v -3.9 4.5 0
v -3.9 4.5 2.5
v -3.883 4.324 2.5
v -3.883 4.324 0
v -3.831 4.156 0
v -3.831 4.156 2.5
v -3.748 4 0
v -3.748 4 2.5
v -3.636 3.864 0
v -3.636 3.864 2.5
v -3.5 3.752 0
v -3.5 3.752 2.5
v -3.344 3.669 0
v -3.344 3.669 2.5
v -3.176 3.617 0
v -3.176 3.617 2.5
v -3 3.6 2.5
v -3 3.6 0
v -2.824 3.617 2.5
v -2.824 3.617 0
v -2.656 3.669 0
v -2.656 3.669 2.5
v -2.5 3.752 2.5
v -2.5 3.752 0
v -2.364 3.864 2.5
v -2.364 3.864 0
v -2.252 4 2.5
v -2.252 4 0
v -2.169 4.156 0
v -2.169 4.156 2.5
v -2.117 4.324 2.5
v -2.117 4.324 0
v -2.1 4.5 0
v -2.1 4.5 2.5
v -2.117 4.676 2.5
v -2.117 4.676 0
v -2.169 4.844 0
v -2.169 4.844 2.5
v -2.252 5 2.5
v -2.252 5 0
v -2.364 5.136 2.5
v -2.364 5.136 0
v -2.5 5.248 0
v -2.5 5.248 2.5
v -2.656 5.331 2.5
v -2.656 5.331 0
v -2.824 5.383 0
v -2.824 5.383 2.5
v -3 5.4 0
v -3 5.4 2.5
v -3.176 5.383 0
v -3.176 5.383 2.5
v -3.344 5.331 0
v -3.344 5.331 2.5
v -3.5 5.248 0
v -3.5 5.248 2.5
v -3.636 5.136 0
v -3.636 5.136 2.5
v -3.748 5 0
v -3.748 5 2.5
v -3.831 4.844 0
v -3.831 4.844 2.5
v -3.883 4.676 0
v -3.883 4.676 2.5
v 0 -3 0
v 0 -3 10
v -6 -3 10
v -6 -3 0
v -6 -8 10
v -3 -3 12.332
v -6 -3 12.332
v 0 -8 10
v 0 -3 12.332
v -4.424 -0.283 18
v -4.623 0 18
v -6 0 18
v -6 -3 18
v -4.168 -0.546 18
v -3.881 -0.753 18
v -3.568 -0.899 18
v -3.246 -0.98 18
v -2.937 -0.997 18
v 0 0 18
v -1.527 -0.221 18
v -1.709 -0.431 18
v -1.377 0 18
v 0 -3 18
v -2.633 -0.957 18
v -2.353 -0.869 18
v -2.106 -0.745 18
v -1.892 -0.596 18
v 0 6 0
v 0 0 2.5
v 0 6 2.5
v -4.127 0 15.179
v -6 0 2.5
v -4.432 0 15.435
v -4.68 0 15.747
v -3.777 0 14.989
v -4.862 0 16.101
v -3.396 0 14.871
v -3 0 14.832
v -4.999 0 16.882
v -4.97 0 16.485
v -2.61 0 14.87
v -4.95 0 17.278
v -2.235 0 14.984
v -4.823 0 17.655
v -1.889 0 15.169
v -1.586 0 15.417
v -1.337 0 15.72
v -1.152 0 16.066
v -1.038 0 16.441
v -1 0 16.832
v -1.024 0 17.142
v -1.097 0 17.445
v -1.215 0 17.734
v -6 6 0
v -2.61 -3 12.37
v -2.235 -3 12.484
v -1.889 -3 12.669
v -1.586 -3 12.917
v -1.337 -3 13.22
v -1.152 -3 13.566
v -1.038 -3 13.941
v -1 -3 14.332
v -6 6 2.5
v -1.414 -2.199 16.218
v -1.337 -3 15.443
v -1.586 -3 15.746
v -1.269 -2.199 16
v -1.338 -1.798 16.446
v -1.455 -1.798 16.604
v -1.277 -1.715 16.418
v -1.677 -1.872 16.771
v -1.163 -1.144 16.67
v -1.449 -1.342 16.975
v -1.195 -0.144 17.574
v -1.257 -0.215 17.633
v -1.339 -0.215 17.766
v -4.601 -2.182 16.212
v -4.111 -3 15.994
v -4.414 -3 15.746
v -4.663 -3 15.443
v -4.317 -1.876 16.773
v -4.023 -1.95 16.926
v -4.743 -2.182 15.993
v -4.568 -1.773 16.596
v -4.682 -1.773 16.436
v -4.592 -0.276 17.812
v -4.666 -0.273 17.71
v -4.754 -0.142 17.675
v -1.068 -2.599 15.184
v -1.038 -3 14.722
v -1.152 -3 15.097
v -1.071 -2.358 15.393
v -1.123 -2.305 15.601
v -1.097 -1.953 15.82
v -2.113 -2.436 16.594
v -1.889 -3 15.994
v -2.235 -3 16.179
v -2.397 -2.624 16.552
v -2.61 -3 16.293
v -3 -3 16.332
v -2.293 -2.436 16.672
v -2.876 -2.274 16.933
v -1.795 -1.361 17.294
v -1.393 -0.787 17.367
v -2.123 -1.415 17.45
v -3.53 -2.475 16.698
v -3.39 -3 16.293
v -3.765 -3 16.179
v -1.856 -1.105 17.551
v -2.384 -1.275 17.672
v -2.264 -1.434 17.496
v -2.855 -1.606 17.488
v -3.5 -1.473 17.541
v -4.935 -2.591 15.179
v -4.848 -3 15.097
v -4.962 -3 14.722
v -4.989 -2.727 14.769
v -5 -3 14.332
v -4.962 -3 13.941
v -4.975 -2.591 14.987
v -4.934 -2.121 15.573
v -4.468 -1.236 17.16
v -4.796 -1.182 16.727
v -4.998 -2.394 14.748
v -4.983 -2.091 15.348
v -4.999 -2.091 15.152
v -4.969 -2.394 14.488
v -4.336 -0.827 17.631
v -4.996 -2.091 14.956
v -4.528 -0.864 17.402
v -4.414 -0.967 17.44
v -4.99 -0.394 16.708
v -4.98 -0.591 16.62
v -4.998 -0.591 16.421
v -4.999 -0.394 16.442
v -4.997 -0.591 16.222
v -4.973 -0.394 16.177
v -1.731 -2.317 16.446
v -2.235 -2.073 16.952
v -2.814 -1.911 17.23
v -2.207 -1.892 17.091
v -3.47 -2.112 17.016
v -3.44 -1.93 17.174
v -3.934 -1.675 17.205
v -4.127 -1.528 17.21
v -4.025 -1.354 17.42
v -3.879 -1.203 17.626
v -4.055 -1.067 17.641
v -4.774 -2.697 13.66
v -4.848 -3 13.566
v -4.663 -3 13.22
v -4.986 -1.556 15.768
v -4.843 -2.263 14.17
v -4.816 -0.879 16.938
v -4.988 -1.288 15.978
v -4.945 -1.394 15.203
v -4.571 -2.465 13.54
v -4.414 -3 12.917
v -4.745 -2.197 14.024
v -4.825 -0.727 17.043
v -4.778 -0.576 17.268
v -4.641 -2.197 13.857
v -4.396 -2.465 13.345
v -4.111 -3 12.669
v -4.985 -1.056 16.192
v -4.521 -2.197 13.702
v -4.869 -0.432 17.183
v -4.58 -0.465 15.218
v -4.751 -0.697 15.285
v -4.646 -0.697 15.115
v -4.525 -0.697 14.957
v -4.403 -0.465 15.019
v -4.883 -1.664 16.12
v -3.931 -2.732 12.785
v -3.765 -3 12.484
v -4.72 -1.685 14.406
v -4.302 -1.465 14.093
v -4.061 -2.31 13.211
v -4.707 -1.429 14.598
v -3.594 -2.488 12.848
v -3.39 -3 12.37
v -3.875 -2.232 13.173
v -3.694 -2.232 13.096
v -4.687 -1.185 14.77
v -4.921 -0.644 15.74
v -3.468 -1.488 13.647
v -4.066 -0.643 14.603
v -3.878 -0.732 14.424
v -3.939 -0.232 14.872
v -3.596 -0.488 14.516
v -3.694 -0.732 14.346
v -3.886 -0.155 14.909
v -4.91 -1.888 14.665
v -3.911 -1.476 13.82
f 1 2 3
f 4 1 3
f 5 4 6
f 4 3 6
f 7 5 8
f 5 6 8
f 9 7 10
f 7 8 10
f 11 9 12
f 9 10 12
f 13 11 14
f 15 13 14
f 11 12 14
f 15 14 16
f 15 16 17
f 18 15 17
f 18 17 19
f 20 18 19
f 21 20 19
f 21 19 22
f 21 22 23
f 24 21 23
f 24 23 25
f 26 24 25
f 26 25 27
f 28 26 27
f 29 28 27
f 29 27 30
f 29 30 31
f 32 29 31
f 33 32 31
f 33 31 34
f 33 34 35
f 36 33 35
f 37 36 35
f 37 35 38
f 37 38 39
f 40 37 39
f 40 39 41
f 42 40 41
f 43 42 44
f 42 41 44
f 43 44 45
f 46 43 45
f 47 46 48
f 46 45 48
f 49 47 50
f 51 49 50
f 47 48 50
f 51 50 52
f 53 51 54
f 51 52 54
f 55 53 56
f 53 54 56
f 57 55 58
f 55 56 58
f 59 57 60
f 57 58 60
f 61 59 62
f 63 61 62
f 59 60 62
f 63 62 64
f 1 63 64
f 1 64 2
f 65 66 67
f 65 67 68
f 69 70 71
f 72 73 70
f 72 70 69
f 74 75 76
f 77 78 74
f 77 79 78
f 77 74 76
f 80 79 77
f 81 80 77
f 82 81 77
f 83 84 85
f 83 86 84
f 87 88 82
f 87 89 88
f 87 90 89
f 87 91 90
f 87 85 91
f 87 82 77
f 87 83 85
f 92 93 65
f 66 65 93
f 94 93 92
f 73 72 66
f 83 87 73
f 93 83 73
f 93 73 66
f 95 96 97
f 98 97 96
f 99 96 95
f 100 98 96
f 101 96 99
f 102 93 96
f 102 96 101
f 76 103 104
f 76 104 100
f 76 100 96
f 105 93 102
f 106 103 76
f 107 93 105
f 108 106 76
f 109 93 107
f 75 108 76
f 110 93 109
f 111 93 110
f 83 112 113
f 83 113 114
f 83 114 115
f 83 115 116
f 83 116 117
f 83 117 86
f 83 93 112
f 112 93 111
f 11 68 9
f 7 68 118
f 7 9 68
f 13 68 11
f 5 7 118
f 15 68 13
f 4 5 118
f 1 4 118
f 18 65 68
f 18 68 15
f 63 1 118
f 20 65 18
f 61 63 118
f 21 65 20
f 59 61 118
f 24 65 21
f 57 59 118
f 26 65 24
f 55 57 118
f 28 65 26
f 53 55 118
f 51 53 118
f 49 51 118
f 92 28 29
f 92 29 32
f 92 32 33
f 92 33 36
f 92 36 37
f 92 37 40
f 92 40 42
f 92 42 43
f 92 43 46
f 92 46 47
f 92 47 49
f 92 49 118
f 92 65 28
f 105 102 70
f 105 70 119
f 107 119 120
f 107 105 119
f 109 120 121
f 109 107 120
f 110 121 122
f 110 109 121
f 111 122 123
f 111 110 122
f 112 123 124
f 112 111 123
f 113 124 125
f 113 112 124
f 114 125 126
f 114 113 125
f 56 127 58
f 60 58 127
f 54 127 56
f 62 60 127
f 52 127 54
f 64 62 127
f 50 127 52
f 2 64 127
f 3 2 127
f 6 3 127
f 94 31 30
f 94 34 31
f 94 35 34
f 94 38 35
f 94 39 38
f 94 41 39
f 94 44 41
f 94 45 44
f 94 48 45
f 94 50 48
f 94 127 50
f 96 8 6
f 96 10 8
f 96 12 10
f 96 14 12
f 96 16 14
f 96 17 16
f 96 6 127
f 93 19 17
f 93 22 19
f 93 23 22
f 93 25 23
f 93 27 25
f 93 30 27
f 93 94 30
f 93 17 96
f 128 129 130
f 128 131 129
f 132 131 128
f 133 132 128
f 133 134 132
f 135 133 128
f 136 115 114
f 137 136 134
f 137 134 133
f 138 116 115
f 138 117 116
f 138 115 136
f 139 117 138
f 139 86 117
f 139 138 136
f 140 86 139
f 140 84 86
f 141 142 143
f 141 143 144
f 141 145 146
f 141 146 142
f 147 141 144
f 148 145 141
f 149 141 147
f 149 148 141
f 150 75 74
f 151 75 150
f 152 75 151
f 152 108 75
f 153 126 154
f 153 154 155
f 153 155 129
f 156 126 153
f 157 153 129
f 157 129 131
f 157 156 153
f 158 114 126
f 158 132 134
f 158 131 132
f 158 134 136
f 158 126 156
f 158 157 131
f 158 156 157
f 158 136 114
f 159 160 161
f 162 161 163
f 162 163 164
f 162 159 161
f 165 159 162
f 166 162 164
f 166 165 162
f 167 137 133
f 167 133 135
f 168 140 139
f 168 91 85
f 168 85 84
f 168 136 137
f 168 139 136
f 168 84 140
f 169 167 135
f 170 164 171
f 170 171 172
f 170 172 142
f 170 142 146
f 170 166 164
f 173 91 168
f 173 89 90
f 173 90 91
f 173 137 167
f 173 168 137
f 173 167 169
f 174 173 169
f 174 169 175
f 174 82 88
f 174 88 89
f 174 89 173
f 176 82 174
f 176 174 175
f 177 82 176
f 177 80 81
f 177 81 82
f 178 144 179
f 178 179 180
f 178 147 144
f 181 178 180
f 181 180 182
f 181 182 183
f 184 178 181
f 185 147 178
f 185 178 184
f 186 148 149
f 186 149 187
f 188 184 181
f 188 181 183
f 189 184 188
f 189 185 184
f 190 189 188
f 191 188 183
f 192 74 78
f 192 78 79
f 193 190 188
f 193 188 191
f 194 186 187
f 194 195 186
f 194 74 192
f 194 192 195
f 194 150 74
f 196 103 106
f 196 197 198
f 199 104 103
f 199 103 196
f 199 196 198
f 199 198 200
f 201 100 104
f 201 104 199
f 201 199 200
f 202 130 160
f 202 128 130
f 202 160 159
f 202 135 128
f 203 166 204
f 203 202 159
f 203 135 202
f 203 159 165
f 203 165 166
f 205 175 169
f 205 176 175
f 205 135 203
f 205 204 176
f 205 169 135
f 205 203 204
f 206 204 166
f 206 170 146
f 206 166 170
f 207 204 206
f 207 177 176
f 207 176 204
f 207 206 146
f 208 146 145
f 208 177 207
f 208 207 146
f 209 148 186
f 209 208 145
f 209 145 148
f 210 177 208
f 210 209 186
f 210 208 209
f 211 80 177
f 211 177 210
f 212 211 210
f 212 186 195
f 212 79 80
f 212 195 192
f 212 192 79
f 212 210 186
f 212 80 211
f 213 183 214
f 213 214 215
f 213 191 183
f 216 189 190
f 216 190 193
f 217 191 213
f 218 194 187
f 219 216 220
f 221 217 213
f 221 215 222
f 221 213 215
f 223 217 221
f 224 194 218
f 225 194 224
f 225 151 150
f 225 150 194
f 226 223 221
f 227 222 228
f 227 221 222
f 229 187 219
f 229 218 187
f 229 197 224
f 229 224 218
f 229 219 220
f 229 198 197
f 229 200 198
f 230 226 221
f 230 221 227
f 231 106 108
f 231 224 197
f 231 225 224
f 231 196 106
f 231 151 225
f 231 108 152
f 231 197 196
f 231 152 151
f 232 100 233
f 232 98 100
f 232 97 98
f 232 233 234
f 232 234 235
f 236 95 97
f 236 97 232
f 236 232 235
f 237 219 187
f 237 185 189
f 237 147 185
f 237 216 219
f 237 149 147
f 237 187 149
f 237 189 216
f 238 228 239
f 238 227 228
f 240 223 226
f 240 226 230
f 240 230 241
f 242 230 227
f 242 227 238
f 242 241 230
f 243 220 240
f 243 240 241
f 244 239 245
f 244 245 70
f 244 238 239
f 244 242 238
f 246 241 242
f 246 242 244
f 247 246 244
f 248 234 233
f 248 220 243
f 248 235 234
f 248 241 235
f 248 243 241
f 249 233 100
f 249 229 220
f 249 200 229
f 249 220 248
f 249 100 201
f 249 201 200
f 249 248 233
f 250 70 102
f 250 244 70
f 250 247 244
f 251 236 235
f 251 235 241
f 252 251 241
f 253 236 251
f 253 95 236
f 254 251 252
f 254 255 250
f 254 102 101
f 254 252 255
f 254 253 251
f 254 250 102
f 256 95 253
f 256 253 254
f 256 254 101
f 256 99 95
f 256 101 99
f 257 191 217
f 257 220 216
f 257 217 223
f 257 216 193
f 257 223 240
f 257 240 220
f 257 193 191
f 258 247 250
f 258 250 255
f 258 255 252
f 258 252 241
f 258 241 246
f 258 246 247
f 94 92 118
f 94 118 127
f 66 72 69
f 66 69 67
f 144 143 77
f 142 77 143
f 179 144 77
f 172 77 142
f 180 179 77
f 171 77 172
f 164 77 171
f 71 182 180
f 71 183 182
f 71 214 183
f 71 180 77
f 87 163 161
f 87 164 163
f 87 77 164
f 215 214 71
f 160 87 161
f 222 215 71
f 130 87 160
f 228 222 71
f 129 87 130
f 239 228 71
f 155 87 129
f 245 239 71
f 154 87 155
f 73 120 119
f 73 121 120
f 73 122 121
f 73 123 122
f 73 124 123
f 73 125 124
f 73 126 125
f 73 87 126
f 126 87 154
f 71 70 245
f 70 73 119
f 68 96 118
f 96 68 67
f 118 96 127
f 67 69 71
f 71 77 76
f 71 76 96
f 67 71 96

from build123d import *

# Parameters (mm, degrees)
F1_DEPTH = 6
F3_D     = 1.8


with BuildPart() as f1:
    # F0 (on Right) → F1 (new body)
    with BuildSketch(Plane.YZ):
        Polygon((-3, 0), (0, 0), (6, 0), (6, 2.5), (0, 2.5), (0, 13.7304612652), (0, 18), (-3, 18), (-3, 12.3315382908), (-8, 10), (-3, 10), align=None)
    extrude(amount=-F1_DEPTH)

    # F3 (through all)
    with Locations(Plane(origin=(0, 0, 0), x_dir=(1, 0, 0), z_dir=(0, 0, -1))):
        with Locations((-3, -4.5)):
            Hole(F3_D / 2)

    # F7: sweep along a path in F6
    with BuildLine(Plane.YZ) as f7_path:
        Line((-3, 14.3315382908), (0, 16.8315382908))
    # F5 (on face) → F7 (sweep, cut)
    with BuildSketch(Plane.XZ.offset(3)):
        with BuildLine():
            ThreePointArc((-3, 12.3315382908), (-1.5857864376, 12.9173247284), (-1, 14.3315382908))
            ThreePointArc((-1, 14.3315382908), (-4.4142135624, 15.7457518531), (-3, 12.3315382908))
        make_face()
    sweep(path=f7_path.line, mode=Mode.SUBTRACT)


solid = f1.part
